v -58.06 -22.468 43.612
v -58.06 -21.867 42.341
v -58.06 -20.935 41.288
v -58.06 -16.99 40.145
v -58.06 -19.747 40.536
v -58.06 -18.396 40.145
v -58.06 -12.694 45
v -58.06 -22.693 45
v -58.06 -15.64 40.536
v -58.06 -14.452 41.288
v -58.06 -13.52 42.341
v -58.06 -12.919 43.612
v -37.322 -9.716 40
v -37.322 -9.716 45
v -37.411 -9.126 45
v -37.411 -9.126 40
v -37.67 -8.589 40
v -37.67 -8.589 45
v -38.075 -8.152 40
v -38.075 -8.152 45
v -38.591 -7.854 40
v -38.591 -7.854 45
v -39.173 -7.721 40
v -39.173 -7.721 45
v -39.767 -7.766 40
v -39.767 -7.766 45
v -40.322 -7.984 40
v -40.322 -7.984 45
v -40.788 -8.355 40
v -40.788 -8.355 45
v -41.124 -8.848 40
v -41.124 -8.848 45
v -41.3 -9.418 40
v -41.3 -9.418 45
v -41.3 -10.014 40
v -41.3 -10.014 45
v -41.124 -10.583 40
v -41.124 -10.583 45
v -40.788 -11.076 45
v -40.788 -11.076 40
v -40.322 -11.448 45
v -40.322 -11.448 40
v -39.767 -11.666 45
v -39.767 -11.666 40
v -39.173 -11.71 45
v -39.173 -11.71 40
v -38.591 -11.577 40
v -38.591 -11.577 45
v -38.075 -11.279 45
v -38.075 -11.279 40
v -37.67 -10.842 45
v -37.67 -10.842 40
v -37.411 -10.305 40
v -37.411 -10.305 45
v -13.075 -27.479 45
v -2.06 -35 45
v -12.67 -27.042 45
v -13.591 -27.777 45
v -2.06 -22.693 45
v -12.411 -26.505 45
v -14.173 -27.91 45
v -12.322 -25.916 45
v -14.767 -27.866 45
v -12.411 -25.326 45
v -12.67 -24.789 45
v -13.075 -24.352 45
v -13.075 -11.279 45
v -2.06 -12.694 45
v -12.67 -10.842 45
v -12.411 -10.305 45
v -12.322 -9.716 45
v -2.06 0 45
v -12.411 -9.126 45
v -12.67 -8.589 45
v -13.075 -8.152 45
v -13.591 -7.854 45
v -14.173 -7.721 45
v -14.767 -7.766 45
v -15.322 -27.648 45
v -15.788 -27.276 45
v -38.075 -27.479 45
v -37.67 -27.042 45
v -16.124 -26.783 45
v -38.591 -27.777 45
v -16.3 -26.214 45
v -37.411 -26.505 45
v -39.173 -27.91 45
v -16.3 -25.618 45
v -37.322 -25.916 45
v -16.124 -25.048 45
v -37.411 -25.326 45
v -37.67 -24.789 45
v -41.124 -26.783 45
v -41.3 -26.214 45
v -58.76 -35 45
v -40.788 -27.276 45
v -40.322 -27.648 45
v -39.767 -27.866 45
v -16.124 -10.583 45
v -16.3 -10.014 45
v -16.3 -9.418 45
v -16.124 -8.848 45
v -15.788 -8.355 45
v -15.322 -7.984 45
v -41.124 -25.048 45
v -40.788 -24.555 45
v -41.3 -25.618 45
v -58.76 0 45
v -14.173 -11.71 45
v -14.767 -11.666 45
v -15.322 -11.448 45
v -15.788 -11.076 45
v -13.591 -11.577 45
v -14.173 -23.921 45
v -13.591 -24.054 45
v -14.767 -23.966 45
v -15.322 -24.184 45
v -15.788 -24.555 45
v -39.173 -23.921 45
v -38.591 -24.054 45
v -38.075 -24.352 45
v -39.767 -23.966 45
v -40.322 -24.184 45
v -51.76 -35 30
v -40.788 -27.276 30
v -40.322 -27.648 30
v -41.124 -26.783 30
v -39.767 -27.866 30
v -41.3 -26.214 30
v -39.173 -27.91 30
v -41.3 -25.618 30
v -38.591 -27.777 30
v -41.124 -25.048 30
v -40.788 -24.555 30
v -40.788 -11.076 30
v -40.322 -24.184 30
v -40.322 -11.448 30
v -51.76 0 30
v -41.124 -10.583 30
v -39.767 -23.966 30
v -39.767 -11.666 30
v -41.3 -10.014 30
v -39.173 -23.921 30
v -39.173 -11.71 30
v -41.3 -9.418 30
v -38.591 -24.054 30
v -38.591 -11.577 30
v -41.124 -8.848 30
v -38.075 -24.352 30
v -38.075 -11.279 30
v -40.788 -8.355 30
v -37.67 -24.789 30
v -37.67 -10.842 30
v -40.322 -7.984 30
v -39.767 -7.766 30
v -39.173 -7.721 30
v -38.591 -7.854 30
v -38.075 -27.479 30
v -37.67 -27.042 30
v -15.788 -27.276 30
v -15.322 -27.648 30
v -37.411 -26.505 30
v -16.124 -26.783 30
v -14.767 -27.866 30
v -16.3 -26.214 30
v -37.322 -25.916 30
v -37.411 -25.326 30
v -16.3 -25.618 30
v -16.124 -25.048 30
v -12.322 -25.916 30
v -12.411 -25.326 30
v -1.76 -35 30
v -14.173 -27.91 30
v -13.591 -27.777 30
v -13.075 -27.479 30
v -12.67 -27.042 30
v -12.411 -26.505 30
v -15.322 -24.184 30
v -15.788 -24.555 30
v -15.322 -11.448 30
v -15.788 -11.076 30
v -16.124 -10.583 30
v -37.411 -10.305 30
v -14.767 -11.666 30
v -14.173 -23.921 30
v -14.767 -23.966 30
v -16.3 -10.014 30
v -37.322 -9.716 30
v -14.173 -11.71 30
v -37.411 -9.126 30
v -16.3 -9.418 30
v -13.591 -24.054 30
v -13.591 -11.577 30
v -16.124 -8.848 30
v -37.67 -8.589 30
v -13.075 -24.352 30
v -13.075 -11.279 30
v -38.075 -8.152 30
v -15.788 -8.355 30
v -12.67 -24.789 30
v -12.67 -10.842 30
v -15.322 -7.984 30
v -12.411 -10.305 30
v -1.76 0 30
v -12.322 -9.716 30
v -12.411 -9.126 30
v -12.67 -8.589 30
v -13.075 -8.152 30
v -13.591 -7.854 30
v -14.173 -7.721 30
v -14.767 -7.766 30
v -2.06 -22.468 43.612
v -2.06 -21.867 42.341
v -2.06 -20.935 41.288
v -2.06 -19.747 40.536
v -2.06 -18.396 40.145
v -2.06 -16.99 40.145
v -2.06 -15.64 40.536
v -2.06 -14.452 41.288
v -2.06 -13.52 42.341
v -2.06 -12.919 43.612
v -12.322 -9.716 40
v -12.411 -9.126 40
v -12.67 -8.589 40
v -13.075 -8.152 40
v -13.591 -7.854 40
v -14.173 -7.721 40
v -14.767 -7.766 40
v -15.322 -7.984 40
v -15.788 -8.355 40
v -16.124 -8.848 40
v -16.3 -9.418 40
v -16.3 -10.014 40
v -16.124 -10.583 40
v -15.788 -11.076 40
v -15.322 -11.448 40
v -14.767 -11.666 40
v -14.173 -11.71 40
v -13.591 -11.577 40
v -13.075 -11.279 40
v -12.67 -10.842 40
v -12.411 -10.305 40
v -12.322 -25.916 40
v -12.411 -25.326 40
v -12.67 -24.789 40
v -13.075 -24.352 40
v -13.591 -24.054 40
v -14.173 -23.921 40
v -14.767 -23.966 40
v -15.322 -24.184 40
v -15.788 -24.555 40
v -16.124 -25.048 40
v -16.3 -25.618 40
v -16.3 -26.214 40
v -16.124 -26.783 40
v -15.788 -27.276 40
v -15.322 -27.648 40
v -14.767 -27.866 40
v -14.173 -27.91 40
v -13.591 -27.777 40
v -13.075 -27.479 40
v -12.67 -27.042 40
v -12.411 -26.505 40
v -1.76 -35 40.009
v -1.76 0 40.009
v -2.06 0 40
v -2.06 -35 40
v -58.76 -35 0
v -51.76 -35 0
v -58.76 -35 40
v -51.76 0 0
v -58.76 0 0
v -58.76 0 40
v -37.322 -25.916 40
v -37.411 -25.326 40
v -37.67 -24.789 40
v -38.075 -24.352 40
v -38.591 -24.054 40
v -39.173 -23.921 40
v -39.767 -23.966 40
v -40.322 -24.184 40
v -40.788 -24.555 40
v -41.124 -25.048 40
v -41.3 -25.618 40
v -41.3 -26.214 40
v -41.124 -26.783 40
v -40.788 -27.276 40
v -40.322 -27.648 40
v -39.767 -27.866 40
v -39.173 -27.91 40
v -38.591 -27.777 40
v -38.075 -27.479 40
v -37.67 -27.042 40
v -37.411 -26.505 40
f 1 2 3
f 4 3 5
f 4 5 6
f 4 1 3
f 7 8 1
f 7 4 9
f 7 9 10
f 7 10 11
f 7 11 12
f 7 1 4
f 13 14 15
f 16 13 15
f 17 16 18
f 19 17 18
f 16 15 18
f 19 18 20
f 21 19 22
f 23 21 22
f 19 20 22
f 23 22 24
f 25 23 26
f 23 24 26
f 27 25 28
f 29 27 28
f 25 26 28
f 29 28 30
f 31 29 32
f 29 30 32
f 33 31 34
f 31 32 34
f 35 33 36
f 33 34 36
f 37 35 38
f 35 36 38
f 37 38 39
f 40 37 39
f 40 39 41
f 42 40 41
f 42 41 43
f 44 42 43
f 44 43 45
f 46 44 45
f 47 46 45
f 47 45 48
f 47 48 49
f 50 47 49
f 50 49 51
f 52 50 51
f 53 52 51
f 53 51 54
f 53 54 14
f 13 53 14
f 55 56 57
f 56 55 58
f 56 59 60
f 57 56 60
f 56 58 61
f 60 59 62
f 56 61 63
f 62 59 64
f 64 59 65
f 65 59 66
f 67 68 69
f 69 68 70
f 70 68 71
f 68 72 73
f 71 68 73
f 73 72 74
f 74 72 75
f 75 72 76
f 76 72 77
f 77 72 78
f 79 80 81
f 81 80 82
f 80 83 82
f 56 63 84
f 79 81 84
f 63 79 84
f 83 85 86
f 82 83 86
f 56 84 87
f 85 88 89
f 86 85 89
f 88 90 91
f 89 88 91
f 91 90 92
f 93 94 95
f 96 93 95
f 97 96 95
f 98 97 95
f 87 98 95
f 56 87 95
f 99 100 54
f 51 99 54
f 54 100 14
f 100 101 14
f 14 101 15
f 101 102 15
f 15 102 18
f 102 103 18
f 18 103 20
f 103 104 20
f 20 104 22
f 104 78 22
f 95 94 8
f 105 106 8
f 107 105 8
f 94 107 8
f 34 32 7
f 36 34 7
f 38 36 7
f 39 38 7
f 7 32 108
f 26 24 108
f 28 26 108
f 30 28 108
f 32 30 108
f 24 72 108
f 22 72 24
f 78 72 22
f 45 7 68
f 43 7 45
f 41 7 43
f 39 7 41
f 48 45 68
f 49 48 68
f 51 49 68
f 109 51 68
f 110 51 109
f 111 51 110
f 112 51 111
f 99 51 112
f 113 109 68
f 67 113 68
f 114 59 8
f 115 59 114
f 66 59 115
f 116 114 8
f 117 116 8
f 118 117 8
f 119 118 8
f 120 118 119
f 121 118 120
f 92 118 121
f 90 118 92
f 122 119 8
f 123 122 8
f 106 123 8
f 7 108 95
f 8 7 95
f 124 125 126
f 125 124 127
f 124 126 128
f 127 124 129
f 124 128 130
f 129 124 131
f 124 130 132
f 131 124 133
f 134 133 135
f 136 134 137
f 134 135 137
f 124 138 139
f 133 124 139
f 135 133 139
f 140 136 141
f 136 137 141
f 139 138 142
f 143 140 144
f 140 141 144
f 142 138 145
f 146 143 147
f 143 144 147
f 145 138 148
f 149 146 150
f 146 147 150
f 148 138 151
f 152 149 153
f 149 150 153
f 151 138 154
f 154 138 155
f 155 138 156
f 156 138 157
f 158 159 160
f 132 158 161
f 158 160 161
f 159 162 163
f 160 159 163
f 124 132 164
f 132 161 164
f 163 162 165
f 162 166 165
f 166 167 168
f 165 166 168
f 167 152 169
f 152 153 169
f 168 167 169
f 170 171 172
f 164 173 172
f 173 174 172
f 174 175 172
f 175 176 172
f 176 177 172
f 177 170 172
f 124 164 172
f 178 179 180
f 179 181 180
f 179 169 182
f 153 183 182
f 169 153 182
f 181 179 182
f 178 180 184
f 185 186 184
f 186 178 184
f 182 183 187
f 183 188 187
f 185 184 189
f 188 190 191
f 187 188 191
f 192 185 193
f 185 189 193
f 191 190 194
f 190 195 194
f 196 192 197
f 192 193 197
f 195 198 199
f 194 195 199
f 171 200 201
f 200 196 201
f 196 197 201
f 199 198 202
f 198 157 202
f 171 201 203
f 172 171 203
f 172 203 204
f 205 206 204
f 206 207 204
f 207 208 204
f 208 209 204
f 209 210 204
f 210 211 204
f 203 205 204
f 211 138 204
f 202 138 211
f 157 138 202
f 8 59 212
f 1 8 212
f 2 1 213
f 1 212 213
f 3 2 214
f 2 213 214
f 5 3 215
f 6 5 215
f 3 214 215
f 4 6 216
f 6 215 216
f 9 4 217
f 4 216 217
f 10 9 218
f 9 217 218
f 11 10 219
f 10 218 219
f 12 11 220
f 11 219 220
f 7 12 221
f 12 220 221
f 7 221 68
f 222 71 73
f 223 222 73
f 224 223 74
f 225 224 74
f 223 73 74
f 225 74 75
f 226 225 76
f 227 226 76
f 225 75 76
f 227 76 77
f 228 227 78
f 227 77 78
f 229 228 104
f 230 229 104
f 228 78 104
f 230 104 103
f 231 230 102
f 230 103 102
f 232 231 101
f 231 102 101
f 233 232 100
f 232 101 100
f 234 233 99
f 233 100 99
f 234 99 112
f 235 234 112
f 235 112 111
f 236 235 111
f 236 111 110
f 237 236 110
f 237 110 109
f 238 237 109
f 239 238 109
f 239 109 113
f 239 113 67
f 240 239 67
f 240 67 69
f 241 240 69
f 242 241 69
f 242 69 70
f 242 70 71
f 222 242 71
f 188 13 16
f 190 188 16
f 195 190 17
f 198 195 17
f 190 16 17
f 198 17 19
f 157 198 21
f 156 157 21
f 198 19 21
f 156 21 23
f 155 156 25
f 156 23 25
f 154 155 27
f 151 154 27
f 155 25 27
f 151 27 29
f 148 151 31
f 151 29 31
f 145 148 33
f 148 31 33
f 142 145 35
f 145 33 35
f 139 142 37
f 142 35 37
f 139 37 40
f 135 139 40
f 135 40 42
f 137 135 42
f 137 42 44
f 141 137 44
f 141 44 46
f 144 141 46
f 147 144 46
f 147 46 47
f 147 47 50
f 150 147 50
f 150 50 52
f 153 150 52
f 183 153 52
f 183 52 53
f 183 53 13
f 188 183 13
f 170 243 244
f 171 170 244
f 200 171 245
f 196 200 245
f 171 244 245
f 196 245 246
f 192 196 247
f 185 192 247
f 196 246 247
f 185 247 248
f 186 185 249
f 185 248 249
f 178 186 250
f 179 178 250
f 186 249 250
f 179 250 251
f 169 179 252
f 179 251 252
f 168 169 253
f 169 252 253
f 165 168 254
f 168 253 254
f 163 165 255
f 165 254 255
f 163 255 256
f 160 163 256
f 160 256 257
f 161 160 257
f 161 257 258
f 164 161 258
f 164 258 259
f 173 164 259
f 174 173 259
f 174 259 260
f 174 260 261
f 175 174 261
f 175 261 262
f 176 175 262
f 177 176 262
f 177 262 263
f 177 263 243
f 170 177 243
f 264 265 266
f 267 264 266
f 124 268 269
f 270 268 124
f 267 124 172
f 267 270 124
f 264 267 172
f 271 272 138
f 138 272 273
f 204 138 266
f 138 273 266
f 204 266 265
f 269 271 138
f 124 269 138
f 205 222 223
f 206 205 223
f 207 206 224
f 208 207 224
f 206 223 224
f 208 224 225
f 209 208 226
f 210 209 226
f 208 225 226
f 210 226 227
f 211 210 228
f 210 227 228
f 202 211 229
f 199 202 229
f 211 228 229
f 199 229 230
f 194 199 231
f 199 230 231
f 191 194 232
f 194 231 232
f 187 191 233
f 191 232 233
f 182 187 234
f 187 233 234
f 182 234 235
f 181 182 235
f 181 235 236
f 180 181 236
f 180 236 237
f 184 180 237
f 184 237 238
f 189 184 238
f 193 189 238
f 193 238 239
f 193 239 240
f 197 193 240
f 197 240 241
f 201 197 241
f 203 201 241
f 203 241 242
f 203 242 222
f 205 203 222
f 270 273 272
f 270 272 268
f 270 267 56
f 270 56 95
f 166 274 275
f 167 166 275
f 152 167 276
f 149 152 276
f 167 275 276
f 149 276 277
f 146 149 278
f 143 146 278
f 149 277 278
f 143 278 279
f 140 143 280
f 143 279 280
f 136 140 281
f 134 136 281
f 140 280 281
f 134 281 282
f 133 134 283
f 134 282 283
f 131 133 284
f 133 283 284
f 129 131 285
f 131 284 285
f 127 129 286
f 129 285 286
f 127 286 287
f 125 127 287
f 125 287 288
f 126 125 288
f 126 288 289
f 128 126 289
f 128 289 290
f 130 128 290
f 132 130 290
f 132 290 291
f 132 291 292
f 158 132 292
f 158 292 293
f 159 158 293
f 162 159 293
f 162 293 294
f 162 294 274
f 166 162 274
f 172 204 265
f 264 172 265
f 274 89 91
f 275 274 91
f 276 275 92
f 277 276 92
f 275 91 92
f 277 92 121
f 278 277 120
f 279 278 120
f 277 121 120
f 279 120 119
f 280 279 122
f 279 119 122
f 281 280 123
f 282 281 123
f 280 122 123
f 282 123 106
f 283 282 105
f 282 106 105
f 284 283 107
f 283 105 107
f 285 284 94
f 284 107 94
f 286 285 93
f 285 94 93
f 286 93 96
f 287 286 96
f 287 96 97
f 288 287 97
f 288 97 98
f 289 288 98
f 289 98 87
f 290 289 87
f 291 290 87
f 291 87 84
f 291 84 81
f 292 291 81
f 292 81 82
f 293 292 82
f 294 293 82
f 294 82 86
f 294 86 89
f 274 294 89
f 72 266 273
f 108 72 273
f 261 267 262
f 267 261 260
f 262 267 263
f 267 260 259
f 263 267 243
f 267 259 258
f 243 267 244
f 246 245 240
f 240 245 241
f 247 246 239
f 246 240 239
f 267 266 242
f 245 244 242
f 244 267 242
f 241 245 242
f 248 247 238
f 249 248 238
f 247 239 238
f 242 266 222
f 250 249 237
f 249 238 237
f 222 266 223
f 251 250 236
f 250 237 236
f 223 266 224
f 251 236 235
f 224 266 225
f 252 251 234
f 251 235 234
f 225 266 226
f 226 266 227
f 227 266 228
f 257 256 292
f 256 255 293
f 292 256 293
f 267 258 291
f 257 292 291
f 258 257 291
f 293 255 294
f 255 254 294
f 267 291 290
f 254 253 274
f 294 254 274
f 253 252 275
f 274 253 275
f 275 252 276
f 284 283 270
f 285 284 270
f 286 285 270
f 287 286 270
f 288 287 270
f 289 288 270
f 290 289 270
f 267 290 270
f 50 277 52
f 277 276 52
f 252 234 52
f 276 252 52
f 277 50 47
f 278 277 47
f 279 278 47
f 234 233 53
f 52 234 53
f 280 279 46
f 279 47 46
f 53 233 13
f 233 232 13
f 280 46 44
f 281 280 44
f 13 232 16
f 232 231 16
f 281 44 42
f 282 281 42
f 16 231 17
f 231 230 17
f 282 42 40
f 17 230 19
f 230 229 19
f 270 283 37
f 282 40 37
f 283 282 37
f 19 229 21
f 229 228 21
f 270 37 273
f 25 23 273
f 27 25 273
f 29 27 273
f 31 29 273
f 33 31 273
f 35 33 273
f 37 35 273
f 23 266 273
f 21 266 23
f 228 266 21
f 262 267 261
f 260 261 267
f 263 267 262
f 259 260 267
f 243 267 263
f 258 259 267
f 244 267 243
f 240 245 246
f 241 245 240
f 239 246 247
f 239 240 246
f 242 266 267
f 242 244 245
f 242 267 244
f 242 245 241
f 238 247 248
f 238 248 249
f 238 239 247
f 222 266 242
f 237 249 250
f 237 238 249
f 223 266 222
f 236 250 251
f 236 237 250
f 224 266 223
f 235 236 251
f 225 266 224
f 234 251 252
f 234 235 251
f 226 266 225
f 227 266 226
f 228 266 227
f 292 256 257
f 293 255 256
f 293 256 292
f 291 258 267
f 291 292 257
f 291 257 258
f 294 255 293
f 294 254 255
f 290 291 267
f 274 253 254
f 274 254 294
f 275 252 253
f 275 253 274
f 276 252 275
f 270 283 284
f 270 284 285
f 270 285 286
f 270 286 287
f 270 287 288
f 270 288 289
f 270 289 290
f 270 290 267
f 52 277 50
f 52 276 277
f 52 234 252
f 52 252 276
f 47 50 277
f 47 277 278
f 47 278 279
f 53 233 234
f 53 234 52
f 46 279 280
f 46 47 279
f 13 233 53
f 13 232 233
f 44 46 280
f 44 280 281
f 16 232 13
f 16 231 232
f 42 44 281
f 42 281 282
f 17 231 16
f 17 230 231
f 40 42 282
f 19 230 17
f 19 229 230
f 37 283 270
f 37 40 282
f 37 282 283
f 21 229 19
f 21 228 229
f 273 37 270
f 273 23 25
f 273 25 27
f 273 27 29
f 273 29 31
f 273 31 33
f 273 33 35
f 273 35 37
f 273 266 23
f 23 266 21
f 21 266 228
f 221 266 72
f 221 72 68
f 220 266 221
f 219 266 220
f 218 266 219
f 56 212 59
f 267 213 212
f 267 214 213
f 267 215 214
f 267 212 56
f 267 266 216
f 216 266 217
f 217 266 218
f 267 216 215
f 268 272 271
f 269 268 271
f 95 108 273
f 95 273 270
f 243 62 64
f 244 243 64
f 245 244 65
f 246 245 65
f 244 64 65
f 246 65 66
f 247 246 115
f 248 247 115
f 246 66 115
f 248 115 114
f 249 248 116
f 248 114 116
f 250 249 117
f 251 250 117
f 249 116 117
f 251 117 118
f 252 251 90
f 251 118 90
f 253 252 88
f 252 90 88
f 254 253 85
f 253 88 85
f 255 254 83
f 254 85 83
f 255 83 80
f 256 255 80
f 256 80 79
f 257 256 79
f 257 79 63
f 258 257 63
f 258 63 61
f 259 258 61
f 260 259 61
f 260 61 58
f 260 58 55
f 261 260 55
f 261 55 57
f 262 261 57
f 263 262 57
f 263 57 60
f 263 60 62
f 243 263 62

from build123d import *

# Parameters (mm, degrees)
F1_DEPTH   = 35
F2_DEPTH   = 5
F3_R       = 5
F4_DEPTH   = 56
F5_R       = 2
F6_DEPTH   = 45.001
F2_FACE1_W = 35
F2_FACE1_H = 5
F1_FACE1_W = 35
F1_FACE1_H = 40
F7_DEPTH   = 3


with BuildPart() as f1:
    # F0 (on Front) → F1 (new body)
    with BuildSketch(Plane.XZ):
        Polygon((-61.7602169514, 0), (-51.7602169514, 0), (-51.7602169514, 30), (-1.7602169514, 30), (-1.7602169514, 40.0090000596), (-2.0602179447, 40), (-61.7602169514, 40), align=None)
    extrude(amount=F1_DEPTH)


with BuildPart() as f2:
    # F2 (new): a face of the model
    f2_faces = [f1.part.faces().sort_by_distance(p)[0] for p in [
        (-31.910217448, -17.5, 40),
    ]]
    extrude(f2_faces, amount=F2_DEPTH)

    # F3 (on face) → F4 (cut)
    with BuildSketch(Plane.YZ.offset(-2.0602179447)):
        with Locations((-17.693480813, 45.095071026)):
            Circle(F3_R)
    extrude(amount=-F4_DEPTH, mode=Mode.SUBTRACT)


with BuildPart() as f6_tool:
    # F5 (on face) → F6 (new body, through all)
    with BuildSketch(Plane.XY.offset(45)):
        with Locations((-39.3220936686, -9.7157170847)):
            Circle(F5_R)
        with Locations((-14.3220936686, -9.7157170847)):
            Circle(F5_R)
        with Locations((-14.3220936686, -25.9157170847)):
            Circle(F5_R)
        with Locations((-39.3220936686, -25.9157170847)):
            Circle(F5_R)
    extrude(amount=-F6_DEPTH)


with BuildPart() as f1_1:
    add(f1.part)

    # F6: cut by f6_tool
    add(f6_tool.part, mode=Mode.SUBTRACT)


with BuildPart() as f2_1:
    add(f2.part)

    # F6: cut by f6_tool
    add(f6_tool.part, mode=Mode.SUBTRACT)


with BuildPart() as f7_tool:
    # F2_face1 (on face) + F1_face1 (on face) → F7 (new body)
    with BuildSketch(Plane(origin=(-61.7602169514, -17.5, 42.5), x_dir=(0, -1, 0), z_dir=(-1, 0, 0))):
        Rectangle(F2_FACE1_W, F2_FACE1_H)
    with BuildSketch(Plane(origin=(-61.7602169514, -17.5, 20), x_dir=(0, -1, 0), z_dir=(-1, 0, 0))):
        Rectangle(F1_FACE1_W, F1_FACE1_H)
    extrude(amount=-F7_DEPTH)


with BuildPart() as f1_2:
    add(f1_1.part)

    # F7: cut by f7_tool
    add(f7_tool.part, mode=Mode.SUBTRACT)


with BuildPart() as f2_2:
    add(f2_1.part)

    # F7: cut by f7_tool
    add(f7_tool.part, mode=Mode.SUBTRACT)


solid = Compound([f1_2.part, f2_2.part])
